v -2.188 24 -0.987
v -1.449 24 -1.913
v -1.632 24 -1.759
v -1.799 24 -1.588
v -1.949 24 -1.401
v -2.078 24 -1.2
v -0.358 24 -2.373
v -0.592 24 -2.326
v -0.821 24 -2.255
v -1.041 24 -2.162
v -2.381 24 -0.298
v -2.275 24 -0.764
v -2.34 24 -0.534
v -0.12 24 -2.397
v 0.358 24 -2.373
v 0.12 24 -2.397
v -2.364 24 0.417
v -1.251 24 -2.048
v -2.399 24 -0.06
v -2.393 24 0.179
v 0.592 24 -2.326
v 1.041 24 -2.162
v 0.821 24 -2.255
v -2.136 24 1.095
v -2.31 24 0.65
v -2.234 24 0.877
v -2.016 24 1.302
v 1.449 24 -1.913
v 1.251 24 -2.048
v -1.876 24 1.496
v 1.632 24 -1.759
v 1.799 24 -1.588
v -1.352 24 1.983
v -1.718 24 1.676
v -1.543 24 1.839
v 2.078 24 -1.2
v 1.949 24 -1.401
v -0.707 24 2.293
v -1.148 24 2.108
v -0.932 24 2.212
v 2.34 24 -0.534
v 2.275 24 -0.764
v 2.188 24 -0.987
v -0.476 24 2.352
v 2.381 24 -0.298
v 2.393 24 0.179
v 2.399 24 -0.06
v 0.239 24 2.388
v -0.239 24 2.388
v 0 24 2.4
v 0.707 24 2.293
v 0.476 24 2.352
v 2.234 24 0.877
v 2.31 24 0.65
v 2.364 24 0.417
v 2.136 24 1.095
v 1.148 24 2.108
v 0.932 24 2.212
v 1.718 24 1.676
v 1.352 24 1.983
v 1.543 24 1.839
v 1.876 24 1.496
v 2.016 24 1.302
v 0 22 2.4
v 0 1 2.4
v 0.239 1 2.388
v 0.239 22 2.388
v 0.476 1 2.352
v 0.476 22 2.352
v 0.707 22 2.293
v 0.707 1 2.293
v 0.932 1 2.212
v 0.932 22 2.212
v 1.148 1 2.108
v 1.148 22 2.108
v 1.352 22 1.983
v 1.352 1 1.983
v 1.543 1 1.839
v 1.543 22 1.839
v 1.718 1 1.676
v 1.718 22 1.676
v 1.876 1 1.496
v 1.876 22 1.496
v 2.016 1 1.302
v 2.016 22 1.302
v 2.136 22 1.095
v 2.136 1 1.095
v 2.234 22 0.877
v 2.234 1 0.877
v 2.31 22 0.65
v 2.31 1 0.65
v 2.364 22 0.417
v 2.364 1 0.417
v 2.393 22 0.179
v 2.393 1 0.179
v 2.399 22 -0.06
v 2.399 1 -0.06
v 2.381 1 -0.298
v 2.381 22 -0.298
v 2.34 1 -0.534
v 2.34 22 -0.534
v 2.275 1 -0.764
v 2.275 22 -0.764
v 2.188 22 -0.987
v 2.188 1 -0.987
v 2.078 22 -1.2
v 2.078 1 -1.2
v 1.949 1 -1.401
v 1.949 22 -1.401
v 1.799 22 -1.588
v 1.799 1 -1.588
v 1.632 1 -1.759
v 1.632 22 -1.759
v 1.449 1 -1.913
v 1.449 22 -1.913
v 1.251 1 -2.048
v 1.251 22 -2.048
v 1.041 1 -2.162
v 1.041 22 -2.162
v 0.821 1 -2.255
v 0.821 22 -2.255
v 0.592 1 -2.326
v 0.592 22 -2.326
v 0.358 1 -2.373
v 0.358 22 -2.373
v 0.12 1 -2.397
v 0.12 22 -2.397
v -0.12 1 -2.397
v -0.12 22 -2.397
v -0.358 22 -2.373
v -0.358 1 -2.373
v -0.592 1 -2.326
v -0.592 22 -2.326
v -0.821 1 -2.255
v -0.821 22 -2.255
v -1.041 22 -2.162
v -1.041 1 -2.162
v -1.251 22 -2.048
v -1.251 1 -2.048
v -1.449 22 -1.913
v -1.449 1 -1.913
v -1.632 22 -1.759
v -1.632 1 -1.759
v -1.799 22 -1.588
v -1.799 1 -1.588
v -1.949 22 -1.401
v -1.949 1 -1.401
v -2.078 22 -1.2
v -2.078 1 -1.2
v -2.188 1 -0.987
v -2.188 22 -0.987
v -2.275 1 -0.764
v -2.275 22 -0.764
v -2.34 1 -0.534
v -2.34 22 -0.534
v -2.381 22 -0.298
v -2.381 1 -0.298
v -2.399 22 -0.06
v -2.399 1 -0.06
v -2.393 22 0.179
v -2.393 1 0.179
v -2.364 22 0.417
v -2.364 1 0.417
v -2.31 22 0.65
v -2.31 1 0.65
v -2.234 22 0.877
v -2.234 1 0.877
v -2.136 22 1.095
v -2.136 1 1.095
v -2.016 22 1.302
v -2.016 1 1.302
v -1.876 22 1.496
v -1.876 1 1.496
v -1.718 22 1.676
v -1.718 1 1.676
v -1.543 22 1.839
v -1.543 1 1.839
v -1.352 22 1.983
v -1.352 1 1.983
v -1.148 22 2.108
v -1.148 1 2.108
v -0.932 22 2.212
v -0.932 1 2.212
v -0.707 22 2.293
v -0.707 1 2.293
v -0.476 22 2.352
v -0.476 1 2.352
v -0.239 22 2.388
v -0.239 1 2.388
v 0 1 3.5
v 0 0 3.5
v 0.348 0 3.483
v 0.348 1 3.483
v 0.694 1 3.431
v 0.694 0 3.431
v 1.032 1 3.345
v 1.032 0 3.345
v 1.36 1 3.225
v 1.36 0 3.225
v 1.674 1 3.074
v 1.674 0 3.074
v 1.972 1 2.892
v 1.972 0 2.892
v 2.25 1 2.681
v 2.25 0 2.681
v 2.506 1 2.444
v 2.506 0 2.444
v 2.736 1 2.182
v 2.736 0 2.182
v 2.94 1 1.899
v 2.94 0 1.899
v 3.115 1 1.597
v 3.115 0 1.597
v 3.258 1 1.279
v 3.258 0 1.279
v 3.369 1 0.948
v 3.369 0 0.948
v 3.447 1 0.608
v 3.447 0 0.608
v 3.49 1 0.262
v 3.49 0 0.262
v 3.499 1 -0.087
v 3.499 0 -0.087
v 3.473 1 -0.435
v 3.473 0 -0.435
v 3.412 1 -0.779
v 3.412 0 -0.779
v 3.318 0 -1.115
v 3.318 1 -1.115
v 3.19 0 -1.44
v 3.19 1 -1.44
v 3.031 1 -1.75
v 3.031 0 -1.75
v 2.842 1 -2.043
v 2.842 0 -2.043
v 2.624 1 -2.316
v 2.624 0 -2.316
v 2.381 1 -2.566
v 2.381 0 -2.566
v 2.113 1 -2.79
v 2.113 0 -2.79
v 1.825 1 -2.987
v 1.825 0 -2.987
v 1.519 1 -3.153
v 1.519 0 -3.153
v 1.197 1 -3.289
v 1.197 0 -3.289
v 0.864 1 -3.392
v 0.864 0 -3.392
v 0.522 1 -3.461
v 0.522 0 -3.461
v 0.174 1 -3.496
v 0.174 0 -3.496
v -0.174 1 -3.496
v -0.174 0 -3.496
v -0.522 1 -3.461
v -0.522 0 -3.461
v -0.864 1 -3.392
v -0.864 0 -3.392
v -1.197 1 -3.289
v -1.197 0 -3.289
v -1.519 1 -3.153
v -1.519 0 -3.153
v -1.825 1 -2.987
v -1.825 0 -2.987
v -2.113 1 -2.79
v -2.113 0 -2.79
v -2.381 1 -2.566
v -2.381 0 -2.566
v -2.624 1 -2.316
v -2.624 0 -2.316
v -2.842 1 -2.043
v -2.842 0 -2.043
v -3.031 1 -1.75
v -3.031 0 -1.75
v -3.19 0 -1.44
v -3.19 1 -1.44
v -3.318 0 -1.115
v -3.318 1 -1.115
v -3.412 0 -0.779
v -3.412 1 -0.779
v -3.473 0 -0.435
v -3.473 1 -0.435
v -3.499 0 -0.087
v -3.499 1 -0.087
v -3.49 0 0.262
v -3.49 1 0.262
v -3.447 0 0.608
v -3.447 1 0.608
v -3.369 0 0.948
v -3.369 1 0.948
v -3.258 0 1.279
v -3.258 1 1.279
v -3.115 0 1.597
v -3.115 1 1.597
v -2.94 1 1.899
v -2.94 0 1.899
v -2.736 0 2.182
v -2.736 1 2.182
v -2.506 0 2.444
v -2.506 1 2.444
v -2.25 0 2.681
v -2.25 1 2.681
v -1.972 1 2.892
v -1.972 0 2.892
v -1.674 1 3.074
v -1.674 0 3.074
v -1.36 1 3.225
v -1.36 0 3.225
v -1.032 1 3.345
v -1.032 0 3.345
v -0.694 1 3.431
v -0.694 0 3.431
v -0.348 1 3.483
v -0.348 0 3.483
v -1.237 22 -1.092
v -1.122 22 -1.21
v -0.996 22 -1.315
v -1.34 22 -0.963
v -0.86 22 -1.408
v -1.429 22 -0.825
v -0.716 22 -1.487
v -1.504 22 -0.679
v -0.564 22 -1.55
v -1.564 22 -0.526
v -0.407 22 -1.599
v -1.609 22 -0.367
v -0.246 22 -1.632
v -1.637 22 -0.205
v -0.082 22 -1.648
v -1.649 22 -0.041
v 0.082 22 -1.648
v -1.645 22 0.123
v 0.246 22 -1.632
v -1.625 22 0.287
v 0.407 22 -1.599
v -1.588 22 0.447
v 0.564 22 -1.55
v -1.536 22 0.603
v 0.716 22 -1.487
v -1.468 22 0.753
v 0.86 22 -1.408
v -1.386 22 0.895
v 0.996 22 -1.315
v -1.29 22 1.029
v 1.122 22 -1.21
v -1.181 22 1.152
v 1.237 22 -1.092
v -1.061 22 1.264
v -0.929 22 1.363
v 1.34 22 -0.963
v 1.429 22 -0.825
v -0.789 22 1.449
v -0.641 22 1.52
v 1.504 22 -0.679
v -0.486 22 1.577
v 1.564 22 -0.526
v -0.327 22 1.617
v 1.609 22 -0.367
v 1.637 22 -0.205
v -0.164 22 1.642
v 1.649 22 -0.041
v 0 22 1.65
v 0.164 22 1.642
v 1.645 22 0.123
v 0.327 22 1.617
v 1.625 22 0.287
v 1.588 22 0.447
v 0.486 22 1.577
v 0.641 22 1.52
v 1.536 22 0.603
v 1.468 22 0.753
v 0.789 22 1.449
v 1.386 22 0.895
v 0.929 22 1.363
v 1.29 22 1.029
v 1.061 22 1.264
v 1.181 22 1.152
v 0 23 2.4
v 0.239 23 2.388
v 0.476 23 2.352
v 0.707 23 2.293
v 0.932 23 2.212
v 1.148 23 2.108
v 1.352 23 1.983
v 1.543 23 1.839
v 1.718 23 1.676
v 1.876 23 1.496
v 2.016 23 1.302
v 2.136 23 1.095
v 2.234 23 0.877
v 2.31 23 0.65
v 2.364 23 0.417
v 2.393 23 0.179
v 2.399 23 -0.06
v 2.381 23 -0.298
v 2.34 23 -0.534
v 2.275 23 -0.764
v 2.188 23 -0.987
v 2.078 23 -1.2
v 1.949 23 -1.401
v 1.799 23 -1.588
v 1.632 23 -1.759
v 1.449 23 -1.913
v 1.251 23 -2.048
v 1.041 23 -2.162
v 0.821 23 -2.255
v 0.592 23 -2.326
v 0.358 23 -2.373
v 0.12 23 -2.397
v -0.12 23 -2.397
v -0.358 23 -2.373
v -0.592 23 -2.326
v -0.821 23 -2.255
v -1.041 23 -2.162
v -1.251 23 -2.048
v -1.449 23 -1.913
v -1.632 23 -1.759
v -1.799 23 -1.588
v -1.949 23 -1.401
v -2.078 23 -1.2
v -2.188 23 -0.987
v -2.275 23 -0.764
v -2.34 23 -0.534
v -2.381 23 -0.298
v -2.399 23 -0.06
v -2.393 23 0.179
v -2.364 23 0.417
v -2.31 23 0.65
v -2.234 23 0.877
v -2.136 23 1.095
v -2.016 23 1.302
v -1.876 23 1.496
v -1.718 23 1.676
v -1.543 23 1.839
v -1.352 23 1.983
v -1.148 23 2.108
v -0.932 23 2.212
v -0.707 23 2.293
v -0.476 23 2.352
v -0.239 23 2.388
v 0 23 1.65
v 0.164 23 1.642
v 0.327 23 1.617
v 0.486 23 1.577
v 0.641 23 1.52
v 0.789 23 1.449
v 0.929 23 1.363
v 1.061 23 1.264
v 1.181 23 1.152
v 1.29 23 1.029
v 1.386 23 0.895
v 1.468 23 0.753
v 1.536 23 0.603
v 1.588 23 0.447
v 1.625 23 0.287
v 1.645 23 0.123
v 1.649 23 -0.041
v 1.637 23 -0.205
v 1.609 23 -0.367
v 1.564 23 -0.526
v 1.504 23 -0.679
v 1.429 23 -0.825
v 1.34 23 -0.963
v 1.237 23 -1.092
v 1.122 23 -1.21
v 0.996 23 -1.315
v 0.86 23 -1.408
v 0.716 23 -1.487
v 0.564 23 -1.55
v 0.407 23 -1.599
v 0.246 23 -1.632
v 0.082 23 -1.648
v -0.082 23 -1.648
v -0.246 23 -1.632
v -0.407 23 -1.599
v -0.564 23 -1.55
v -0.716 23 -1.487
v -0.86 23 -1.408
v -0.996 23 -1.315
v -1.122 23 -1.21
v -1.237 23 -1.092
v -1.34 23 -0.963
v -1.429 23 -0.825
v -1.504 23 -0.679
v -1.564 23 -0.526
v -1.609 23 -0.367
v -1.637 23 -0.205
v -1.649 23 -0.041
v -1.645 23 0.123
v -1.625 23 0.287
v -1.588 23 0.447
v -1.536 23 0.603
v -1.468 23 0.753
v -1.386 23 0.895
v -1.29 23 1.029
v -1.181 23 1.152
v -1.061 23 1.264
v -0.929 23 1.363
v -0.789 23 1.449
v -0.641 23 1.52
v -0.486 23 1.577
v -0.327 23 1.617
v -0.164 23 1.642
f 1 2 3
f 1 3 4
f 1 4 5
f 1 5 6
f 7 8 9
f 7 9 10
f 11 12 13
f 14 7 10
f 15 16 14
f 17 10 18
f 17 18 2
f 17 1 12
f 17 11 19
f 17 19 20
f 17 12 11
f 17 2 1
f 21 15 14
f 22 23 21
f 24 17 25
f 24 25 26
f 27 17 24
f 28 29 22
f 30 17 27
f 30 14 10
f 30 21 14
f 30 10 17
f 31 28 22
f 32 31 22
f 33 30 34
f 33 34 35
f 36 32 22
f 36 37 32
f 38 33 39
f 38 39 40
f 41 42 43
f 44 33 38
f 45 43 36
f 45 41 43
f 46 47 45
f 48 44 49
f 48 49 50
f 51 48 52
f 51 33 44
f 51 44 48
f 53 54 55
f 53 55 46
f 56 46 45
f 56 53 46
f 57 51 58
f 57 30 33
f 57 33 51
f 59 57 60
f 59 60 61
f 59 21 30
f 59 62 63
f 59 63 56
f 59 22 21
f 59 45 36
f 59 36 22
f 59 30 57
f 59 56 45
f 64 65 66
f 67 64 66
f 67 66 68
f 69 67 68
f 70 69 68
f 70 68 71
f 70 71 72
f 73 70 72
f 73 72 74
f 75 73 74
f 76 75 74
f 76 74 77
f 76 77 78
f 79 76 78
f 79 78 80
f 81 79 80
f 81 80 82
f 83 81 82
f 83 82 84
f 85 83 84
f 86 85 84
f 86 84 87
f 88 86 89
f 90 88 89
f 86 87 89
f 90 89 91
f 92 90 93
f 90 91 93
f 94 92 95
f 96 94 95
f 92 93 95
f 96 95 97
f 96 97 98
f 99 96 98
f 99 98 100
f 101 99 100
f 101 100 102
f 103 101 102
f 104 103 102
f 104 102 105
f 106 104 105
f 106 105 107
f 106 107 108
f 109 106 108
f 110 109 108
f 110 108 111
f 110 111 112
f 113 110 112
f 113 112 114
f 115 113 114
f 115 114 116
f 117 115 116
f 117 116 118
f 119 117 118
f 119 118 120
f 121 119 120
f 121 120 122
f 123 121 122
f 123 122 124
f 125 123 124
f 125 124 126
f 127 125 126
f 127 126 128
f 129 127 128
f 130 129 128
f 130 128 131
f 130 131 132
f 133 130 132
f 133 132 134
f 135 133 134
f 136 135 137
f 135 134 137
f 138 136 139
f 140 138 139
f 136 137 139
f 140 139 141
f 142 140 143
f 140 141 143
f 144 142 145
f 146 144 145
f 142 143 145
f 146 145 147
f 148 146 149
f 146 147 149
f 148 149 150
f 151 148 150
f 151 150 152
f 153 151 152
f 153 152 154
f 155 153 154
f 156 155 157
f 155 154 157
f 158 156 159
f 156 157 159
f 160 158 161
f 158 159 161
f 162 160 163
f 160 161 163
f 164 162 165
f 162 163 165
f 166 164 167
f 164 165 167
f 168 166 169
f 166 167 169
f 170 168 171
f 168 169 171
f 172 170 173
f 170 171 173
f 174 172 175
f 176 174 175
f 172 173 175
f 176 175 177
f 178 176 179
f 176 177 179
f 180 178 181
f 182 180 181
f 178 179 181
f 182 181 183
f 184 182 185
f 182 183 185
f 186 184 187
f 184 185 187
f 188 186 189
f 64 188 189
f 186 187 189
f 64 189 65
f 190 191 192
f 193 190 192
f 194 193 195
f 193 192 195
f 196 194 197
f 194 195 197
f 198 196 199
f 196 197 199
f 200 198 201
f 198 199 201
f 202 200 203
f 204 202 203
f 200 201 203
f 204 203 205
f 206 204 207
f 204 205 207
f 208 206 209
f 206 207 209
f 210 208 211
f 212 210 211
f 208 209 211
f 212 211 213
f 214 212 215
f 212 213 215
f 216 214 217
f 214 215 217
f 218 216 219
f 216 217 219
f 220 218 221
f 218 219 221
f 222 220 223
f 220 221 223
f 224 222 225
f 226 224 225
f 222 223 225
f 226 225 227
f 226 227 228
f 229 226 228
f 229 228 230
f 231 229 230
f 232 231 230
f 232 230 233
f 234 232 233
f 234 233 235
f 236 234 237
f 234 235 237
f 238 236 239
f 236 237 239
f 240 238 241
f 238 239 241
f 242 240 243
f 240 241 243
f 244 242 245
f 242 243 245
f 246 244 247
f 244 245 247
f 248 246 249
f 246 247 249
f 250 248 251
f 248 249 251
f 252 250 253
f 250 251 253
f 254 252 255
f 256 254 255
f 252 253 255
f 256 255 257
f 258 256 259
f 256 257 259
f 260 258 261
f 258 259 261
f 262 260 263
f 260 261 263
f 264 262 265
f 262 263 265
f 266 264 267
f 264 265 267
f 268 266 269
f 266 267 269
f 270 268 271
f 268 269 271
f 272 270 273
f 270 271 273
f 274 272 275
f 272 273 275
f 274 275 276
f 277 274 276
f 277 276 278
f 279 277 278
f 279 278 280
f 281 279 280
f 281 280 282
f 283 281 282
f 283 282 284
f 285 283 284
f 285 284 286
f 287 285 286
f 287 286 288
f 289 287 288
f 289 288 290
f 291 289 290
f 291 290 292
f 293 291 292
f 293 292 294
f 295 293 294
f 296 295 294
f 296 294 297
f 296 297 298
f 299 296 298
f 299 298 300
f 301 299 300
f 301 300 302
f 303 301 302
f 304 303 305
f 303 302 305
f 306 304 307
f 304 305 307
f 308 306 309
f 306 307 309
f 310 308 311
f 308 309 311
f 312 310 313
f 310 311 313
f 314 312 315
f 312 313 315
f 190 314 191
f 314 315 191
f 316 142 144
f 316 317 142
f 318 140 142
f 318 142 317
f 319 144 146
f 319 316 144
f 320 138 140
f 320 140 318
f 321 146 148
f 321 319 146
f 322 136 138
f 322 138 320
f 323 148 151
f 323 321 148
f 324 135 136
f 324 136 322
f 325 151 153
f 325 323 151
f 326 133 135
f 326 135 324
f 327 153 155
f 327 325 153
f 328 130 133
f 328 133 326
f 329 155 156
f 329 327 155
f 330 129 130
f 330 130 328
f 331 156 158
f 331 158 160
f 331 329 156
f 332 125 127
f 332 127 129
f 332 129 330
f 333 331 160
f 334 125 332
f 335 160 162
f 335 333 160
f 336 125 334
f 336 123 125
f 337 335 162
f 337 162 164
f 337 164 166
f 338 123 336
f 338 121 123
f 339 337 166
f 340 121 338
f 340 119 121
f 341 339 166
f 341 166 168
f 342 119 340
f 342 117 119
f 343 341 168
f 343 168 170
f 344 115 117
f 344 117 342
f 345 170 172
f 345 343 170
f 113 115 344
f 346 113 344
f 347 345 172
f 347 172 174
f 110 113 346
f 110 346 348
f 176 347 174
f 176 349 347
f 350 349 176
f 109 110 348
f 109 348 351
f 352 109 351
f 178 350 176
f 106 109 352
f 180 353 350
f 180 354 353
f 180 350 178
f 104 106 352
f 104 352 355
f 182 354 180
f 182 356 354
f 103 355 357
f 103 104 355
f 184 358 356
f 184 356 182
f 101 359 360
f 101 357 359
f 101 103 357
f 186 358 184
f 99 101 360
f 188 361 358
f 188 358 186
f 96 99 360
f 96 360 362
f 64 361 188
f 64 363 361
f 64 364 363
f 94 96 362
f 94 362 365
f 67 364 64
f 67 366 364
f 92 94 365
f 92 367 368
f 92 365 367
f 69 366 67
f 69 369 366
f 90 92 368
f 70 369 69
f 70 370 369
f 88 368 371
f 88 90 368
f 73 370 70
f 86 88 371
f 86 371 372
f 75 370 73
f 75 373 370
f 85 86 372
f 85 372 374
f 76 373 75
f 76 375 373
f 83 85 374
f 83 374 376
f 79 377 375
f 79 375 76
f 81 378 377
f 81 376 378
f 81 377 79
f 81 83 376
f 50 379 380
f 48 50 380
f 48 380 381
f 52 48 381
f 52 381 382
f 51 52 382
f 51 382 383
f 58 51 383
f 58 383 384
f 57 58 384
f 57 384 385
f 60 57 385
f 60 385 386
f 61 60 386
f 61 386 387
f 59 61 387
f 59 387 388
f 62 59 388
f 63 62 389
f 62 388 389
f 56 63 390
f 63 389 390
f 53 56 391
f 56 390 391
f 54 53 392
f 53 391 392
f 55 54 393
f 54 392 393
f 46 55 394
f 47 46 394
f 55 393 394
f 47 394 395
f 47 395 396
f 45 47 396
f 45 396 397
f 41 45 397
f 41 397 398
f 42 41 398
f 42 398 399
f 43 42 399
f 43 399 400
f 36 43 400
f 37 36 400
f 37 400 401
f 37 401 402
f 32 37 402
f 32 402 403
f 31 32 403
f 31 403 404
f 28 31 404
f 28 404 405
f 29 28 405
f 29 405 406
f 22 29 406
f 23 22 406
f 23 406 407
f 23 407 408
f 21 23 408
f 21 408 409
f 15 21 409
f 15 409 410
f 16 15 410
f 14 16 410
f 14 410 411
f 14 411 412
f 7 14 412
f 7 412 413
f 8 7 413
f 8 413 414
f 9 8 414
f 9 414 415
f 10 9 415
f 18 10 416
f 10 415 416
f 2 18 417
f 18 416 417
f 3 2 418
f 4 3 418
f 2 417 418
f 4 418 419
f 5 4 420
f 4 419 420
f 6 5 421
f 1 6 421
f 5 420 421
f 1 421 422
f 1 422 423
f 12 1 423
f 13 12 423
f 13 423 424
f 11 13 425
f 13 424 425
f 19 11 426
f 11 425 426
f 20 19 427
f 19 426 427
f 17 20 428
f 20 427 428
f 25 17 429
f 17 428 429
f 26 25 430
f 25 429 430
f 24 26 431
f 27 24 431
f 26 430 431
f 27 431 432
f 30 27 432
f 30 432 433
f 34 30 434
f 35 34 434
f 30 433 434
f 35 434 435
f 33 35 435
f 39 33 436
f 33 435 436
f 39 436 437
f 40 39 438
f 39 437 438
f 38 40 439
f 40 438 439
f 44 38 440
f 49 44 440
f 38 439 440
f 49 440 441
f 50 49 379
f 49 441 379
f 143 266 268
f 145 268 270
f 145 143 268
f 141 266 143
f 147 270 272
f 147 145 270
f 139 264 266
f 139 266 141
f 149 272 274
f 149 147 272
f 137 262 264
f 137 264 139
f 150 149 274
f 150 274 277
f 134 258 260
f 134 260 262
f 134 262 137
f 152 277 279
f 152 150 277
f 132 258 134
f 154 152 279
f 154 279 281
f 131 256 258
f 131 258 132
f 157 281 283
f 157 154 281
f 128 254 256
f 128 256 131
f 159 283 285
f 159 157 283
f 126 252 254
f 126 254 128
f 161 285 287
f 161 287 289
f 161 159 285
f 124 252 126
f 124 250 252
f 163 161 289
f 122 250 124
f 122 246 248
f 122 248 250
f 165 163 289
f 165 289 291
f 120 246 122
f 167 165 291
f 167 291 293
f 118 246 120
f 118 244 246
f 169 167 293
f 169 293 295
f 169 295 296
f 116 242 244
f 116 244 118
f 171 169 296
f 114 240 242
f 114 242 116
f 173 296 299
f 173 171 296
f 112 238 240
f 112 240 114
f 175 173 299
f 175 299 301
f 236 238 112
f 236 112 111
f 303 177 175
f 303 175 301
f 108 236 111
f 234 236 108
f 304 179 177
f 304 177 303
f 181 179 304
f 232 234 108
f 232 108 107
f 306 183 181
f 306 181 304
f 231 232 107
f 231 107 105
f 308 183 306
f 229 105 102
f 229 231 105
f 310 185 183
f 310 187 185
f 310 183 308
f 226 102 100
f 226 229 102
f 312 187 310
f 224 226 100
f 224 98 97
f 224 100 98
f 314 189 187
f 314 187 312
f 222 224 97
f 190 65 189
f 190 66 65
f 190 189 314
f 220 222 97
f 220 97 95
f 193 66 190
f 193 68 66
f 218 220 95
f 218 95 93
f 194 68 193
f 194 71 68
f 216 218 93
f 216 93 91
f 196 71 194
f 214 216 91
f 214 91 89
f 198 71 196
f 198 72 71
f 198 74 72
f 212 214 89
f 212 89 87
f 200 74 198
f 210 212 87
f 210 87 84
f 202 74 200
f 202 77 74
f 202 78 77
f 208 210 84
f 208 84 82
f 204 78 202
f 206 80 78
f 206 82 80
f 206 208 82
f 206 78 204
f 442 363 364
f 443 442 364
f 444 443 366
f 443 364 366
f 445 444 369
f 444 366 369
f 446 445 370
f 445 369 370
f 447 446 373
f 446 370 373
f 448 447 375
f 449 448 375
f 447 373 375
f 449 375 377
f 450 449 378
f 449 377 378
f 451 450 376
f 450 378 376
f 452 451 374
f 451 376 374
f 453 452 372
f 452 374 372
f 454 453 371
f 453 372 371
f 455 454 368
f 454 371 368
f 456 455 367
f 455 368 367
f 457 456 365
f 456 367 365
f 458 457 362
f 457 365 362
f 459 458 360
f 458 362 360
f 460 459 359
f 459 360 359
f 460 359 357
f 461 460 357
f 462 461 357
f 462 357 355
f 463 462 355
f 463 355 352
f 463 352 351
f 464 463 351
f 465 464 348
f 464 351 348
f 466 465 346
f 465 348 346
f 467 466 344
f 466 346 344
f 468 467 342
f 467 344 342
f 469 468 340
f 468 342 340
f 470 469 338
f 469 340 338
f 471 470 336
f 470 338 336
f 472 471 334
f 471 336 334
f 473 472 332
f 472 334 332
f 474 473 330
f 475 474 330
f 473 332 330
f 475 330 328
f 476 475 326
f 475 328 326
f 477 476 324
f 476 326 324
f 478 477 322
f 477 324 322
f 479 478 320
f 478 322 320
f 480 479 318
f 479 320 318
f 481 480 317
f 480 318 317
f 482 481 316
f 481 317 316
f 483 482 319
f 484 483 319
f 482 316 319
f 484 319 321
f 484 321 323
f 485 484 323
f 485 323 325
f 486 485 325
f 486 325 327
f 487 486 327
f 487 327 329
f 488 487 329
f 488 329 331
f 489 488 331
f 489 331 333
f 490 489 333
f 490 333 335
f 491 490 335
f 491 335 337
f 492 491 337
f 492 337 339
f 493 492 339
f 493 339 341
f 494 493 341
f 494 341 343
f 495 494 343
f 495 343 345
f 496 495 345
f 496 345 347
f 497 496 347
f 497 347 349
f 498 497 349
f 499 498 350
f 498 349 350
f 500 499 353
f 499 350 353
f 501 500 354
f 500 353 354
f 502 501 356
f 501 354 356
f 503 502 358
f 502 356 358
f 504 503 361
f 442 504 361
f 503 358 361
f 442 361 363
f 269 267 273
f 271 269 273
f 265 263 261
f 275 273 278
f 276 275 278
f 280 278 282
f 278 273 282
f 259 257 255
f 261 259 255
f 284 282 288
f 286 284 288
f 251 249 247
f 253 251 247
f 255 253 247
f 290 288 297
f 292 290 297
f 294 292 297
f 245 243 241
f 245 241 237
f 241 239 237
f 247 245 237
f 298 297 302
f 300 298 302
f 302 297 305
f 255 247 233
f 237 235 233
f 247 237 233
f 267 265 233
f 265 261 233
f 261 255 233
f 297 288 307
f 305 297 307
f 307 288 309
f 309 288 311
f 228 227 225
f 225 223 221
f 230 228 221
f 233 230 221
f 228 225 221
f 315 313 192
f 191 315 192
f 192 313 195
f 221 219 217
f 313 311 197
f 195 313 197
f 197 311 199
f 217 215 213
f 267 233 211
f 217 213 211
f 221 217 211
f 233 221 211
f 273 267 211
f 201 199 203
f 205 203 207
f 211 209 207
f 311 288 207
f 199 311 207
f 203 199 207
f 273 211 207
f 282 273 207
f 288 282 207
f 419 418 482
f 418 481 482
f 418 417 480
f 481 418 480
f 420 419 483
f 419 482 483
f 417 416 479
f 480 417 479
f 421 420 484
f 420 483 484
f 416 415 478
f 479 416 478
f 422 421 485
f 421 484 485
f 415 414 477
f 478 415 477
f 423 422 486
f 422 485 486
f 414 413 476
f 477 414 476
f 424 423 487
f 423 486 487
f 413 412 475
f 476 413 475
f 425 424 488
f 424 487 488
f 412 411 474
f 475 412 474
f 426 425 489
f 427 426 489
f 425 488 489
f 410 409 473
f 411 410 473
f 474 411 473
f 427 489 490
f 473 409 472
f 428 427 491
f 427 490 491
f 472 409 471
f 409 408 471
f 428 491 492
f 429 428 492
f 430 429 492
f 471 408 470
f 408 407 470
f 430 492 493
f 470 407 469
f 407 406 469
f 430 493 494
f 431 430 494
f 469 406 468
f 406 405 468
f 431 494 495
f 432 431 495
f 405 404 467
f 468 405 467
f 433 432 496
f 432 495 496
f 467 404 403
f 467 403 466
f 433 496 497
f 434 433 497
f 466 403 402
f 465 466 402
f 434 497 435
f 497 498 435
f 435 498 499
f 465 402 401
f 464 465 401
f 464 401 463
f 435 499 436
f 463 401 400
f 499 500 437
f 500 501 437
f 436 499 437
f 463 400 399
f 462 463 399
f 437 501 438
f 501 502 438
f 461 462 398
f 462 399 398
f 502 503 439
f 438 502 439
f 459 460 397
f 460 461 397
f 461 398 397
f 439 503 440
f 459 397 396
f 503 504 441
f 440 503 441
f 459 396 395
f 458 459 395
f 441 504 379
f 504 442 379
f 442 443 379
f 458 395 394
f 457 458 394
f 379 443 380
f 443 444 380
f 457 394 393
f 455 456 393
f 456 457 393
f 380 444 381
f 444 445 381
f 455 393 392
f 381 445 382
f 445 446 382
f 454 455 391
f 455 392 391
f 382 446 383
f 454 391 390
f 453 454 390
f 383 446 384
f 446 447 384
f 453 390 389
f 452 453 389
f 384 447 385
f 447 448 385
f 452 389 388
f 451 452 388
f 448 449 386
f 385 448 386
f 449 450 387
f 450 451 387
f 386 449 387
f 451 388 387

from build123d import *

# Parameters (mm, degrees)
CROQUIS1_R              = 3.5
CROQUIS1_R_2            = 2.4
SALIENTE_EXTRUIR1_DEPTH = 1
CROQUIS1_2_R            = 2.4
SALIENTE_EXTRUIR2_DEPTH = 24
CORTAR_EXTRUIR1_START   = -2
CROQUIS2_R              = 2.4
CROQUIS2_R_2            = 1.65
CORTAR_EXTRUIR1_DEPTH   = 1


with BuildPart() as part:
    # Croquis1 → Saliente-Extruir1 (new body)
    with BuildSketch(Plane(origin=(0, 0, 0), x_dir=(1, 0, 0), z_dir=(0, 1, 0))):
        Circle(CROQUIS1_R)
        Circle(CROQUIS1_R_2, mode=Mode.SUBTRACT)
    extrude(amount=SALIENTE_EXTRUIR1_DEPTH)

    # Croquis1<2> → Saliente-Extruir2 (add)
    with BuildSketch(Plane(origin=(0, 0, 0), x_dir=(1, 0, 0), z_dir=(0, 1, 0))):
        Circle(CROQUIS1_2_R)
    extrude(amount=SALIENTE_EXTRUIR2_DEPTH)

    # Croquis2 → Cortar-Extruir1 (cut)
    with BuildSketch(Plane(origin=(0, 24, 0), x_dir=(1, 0, 0), z_dir=(0, 1, 0)).offset(CORTAR_EXTRUIR1_START)):
        Circle(CROQUIS2_R)
        Circle(CROQUIS2_R_2, mode=Mode.SUBTRACT)
    extrude(amount=CORTAR_EXTRUIR1_DEPTH, mode=Mode.SUBTRACT)


solid = part.part
